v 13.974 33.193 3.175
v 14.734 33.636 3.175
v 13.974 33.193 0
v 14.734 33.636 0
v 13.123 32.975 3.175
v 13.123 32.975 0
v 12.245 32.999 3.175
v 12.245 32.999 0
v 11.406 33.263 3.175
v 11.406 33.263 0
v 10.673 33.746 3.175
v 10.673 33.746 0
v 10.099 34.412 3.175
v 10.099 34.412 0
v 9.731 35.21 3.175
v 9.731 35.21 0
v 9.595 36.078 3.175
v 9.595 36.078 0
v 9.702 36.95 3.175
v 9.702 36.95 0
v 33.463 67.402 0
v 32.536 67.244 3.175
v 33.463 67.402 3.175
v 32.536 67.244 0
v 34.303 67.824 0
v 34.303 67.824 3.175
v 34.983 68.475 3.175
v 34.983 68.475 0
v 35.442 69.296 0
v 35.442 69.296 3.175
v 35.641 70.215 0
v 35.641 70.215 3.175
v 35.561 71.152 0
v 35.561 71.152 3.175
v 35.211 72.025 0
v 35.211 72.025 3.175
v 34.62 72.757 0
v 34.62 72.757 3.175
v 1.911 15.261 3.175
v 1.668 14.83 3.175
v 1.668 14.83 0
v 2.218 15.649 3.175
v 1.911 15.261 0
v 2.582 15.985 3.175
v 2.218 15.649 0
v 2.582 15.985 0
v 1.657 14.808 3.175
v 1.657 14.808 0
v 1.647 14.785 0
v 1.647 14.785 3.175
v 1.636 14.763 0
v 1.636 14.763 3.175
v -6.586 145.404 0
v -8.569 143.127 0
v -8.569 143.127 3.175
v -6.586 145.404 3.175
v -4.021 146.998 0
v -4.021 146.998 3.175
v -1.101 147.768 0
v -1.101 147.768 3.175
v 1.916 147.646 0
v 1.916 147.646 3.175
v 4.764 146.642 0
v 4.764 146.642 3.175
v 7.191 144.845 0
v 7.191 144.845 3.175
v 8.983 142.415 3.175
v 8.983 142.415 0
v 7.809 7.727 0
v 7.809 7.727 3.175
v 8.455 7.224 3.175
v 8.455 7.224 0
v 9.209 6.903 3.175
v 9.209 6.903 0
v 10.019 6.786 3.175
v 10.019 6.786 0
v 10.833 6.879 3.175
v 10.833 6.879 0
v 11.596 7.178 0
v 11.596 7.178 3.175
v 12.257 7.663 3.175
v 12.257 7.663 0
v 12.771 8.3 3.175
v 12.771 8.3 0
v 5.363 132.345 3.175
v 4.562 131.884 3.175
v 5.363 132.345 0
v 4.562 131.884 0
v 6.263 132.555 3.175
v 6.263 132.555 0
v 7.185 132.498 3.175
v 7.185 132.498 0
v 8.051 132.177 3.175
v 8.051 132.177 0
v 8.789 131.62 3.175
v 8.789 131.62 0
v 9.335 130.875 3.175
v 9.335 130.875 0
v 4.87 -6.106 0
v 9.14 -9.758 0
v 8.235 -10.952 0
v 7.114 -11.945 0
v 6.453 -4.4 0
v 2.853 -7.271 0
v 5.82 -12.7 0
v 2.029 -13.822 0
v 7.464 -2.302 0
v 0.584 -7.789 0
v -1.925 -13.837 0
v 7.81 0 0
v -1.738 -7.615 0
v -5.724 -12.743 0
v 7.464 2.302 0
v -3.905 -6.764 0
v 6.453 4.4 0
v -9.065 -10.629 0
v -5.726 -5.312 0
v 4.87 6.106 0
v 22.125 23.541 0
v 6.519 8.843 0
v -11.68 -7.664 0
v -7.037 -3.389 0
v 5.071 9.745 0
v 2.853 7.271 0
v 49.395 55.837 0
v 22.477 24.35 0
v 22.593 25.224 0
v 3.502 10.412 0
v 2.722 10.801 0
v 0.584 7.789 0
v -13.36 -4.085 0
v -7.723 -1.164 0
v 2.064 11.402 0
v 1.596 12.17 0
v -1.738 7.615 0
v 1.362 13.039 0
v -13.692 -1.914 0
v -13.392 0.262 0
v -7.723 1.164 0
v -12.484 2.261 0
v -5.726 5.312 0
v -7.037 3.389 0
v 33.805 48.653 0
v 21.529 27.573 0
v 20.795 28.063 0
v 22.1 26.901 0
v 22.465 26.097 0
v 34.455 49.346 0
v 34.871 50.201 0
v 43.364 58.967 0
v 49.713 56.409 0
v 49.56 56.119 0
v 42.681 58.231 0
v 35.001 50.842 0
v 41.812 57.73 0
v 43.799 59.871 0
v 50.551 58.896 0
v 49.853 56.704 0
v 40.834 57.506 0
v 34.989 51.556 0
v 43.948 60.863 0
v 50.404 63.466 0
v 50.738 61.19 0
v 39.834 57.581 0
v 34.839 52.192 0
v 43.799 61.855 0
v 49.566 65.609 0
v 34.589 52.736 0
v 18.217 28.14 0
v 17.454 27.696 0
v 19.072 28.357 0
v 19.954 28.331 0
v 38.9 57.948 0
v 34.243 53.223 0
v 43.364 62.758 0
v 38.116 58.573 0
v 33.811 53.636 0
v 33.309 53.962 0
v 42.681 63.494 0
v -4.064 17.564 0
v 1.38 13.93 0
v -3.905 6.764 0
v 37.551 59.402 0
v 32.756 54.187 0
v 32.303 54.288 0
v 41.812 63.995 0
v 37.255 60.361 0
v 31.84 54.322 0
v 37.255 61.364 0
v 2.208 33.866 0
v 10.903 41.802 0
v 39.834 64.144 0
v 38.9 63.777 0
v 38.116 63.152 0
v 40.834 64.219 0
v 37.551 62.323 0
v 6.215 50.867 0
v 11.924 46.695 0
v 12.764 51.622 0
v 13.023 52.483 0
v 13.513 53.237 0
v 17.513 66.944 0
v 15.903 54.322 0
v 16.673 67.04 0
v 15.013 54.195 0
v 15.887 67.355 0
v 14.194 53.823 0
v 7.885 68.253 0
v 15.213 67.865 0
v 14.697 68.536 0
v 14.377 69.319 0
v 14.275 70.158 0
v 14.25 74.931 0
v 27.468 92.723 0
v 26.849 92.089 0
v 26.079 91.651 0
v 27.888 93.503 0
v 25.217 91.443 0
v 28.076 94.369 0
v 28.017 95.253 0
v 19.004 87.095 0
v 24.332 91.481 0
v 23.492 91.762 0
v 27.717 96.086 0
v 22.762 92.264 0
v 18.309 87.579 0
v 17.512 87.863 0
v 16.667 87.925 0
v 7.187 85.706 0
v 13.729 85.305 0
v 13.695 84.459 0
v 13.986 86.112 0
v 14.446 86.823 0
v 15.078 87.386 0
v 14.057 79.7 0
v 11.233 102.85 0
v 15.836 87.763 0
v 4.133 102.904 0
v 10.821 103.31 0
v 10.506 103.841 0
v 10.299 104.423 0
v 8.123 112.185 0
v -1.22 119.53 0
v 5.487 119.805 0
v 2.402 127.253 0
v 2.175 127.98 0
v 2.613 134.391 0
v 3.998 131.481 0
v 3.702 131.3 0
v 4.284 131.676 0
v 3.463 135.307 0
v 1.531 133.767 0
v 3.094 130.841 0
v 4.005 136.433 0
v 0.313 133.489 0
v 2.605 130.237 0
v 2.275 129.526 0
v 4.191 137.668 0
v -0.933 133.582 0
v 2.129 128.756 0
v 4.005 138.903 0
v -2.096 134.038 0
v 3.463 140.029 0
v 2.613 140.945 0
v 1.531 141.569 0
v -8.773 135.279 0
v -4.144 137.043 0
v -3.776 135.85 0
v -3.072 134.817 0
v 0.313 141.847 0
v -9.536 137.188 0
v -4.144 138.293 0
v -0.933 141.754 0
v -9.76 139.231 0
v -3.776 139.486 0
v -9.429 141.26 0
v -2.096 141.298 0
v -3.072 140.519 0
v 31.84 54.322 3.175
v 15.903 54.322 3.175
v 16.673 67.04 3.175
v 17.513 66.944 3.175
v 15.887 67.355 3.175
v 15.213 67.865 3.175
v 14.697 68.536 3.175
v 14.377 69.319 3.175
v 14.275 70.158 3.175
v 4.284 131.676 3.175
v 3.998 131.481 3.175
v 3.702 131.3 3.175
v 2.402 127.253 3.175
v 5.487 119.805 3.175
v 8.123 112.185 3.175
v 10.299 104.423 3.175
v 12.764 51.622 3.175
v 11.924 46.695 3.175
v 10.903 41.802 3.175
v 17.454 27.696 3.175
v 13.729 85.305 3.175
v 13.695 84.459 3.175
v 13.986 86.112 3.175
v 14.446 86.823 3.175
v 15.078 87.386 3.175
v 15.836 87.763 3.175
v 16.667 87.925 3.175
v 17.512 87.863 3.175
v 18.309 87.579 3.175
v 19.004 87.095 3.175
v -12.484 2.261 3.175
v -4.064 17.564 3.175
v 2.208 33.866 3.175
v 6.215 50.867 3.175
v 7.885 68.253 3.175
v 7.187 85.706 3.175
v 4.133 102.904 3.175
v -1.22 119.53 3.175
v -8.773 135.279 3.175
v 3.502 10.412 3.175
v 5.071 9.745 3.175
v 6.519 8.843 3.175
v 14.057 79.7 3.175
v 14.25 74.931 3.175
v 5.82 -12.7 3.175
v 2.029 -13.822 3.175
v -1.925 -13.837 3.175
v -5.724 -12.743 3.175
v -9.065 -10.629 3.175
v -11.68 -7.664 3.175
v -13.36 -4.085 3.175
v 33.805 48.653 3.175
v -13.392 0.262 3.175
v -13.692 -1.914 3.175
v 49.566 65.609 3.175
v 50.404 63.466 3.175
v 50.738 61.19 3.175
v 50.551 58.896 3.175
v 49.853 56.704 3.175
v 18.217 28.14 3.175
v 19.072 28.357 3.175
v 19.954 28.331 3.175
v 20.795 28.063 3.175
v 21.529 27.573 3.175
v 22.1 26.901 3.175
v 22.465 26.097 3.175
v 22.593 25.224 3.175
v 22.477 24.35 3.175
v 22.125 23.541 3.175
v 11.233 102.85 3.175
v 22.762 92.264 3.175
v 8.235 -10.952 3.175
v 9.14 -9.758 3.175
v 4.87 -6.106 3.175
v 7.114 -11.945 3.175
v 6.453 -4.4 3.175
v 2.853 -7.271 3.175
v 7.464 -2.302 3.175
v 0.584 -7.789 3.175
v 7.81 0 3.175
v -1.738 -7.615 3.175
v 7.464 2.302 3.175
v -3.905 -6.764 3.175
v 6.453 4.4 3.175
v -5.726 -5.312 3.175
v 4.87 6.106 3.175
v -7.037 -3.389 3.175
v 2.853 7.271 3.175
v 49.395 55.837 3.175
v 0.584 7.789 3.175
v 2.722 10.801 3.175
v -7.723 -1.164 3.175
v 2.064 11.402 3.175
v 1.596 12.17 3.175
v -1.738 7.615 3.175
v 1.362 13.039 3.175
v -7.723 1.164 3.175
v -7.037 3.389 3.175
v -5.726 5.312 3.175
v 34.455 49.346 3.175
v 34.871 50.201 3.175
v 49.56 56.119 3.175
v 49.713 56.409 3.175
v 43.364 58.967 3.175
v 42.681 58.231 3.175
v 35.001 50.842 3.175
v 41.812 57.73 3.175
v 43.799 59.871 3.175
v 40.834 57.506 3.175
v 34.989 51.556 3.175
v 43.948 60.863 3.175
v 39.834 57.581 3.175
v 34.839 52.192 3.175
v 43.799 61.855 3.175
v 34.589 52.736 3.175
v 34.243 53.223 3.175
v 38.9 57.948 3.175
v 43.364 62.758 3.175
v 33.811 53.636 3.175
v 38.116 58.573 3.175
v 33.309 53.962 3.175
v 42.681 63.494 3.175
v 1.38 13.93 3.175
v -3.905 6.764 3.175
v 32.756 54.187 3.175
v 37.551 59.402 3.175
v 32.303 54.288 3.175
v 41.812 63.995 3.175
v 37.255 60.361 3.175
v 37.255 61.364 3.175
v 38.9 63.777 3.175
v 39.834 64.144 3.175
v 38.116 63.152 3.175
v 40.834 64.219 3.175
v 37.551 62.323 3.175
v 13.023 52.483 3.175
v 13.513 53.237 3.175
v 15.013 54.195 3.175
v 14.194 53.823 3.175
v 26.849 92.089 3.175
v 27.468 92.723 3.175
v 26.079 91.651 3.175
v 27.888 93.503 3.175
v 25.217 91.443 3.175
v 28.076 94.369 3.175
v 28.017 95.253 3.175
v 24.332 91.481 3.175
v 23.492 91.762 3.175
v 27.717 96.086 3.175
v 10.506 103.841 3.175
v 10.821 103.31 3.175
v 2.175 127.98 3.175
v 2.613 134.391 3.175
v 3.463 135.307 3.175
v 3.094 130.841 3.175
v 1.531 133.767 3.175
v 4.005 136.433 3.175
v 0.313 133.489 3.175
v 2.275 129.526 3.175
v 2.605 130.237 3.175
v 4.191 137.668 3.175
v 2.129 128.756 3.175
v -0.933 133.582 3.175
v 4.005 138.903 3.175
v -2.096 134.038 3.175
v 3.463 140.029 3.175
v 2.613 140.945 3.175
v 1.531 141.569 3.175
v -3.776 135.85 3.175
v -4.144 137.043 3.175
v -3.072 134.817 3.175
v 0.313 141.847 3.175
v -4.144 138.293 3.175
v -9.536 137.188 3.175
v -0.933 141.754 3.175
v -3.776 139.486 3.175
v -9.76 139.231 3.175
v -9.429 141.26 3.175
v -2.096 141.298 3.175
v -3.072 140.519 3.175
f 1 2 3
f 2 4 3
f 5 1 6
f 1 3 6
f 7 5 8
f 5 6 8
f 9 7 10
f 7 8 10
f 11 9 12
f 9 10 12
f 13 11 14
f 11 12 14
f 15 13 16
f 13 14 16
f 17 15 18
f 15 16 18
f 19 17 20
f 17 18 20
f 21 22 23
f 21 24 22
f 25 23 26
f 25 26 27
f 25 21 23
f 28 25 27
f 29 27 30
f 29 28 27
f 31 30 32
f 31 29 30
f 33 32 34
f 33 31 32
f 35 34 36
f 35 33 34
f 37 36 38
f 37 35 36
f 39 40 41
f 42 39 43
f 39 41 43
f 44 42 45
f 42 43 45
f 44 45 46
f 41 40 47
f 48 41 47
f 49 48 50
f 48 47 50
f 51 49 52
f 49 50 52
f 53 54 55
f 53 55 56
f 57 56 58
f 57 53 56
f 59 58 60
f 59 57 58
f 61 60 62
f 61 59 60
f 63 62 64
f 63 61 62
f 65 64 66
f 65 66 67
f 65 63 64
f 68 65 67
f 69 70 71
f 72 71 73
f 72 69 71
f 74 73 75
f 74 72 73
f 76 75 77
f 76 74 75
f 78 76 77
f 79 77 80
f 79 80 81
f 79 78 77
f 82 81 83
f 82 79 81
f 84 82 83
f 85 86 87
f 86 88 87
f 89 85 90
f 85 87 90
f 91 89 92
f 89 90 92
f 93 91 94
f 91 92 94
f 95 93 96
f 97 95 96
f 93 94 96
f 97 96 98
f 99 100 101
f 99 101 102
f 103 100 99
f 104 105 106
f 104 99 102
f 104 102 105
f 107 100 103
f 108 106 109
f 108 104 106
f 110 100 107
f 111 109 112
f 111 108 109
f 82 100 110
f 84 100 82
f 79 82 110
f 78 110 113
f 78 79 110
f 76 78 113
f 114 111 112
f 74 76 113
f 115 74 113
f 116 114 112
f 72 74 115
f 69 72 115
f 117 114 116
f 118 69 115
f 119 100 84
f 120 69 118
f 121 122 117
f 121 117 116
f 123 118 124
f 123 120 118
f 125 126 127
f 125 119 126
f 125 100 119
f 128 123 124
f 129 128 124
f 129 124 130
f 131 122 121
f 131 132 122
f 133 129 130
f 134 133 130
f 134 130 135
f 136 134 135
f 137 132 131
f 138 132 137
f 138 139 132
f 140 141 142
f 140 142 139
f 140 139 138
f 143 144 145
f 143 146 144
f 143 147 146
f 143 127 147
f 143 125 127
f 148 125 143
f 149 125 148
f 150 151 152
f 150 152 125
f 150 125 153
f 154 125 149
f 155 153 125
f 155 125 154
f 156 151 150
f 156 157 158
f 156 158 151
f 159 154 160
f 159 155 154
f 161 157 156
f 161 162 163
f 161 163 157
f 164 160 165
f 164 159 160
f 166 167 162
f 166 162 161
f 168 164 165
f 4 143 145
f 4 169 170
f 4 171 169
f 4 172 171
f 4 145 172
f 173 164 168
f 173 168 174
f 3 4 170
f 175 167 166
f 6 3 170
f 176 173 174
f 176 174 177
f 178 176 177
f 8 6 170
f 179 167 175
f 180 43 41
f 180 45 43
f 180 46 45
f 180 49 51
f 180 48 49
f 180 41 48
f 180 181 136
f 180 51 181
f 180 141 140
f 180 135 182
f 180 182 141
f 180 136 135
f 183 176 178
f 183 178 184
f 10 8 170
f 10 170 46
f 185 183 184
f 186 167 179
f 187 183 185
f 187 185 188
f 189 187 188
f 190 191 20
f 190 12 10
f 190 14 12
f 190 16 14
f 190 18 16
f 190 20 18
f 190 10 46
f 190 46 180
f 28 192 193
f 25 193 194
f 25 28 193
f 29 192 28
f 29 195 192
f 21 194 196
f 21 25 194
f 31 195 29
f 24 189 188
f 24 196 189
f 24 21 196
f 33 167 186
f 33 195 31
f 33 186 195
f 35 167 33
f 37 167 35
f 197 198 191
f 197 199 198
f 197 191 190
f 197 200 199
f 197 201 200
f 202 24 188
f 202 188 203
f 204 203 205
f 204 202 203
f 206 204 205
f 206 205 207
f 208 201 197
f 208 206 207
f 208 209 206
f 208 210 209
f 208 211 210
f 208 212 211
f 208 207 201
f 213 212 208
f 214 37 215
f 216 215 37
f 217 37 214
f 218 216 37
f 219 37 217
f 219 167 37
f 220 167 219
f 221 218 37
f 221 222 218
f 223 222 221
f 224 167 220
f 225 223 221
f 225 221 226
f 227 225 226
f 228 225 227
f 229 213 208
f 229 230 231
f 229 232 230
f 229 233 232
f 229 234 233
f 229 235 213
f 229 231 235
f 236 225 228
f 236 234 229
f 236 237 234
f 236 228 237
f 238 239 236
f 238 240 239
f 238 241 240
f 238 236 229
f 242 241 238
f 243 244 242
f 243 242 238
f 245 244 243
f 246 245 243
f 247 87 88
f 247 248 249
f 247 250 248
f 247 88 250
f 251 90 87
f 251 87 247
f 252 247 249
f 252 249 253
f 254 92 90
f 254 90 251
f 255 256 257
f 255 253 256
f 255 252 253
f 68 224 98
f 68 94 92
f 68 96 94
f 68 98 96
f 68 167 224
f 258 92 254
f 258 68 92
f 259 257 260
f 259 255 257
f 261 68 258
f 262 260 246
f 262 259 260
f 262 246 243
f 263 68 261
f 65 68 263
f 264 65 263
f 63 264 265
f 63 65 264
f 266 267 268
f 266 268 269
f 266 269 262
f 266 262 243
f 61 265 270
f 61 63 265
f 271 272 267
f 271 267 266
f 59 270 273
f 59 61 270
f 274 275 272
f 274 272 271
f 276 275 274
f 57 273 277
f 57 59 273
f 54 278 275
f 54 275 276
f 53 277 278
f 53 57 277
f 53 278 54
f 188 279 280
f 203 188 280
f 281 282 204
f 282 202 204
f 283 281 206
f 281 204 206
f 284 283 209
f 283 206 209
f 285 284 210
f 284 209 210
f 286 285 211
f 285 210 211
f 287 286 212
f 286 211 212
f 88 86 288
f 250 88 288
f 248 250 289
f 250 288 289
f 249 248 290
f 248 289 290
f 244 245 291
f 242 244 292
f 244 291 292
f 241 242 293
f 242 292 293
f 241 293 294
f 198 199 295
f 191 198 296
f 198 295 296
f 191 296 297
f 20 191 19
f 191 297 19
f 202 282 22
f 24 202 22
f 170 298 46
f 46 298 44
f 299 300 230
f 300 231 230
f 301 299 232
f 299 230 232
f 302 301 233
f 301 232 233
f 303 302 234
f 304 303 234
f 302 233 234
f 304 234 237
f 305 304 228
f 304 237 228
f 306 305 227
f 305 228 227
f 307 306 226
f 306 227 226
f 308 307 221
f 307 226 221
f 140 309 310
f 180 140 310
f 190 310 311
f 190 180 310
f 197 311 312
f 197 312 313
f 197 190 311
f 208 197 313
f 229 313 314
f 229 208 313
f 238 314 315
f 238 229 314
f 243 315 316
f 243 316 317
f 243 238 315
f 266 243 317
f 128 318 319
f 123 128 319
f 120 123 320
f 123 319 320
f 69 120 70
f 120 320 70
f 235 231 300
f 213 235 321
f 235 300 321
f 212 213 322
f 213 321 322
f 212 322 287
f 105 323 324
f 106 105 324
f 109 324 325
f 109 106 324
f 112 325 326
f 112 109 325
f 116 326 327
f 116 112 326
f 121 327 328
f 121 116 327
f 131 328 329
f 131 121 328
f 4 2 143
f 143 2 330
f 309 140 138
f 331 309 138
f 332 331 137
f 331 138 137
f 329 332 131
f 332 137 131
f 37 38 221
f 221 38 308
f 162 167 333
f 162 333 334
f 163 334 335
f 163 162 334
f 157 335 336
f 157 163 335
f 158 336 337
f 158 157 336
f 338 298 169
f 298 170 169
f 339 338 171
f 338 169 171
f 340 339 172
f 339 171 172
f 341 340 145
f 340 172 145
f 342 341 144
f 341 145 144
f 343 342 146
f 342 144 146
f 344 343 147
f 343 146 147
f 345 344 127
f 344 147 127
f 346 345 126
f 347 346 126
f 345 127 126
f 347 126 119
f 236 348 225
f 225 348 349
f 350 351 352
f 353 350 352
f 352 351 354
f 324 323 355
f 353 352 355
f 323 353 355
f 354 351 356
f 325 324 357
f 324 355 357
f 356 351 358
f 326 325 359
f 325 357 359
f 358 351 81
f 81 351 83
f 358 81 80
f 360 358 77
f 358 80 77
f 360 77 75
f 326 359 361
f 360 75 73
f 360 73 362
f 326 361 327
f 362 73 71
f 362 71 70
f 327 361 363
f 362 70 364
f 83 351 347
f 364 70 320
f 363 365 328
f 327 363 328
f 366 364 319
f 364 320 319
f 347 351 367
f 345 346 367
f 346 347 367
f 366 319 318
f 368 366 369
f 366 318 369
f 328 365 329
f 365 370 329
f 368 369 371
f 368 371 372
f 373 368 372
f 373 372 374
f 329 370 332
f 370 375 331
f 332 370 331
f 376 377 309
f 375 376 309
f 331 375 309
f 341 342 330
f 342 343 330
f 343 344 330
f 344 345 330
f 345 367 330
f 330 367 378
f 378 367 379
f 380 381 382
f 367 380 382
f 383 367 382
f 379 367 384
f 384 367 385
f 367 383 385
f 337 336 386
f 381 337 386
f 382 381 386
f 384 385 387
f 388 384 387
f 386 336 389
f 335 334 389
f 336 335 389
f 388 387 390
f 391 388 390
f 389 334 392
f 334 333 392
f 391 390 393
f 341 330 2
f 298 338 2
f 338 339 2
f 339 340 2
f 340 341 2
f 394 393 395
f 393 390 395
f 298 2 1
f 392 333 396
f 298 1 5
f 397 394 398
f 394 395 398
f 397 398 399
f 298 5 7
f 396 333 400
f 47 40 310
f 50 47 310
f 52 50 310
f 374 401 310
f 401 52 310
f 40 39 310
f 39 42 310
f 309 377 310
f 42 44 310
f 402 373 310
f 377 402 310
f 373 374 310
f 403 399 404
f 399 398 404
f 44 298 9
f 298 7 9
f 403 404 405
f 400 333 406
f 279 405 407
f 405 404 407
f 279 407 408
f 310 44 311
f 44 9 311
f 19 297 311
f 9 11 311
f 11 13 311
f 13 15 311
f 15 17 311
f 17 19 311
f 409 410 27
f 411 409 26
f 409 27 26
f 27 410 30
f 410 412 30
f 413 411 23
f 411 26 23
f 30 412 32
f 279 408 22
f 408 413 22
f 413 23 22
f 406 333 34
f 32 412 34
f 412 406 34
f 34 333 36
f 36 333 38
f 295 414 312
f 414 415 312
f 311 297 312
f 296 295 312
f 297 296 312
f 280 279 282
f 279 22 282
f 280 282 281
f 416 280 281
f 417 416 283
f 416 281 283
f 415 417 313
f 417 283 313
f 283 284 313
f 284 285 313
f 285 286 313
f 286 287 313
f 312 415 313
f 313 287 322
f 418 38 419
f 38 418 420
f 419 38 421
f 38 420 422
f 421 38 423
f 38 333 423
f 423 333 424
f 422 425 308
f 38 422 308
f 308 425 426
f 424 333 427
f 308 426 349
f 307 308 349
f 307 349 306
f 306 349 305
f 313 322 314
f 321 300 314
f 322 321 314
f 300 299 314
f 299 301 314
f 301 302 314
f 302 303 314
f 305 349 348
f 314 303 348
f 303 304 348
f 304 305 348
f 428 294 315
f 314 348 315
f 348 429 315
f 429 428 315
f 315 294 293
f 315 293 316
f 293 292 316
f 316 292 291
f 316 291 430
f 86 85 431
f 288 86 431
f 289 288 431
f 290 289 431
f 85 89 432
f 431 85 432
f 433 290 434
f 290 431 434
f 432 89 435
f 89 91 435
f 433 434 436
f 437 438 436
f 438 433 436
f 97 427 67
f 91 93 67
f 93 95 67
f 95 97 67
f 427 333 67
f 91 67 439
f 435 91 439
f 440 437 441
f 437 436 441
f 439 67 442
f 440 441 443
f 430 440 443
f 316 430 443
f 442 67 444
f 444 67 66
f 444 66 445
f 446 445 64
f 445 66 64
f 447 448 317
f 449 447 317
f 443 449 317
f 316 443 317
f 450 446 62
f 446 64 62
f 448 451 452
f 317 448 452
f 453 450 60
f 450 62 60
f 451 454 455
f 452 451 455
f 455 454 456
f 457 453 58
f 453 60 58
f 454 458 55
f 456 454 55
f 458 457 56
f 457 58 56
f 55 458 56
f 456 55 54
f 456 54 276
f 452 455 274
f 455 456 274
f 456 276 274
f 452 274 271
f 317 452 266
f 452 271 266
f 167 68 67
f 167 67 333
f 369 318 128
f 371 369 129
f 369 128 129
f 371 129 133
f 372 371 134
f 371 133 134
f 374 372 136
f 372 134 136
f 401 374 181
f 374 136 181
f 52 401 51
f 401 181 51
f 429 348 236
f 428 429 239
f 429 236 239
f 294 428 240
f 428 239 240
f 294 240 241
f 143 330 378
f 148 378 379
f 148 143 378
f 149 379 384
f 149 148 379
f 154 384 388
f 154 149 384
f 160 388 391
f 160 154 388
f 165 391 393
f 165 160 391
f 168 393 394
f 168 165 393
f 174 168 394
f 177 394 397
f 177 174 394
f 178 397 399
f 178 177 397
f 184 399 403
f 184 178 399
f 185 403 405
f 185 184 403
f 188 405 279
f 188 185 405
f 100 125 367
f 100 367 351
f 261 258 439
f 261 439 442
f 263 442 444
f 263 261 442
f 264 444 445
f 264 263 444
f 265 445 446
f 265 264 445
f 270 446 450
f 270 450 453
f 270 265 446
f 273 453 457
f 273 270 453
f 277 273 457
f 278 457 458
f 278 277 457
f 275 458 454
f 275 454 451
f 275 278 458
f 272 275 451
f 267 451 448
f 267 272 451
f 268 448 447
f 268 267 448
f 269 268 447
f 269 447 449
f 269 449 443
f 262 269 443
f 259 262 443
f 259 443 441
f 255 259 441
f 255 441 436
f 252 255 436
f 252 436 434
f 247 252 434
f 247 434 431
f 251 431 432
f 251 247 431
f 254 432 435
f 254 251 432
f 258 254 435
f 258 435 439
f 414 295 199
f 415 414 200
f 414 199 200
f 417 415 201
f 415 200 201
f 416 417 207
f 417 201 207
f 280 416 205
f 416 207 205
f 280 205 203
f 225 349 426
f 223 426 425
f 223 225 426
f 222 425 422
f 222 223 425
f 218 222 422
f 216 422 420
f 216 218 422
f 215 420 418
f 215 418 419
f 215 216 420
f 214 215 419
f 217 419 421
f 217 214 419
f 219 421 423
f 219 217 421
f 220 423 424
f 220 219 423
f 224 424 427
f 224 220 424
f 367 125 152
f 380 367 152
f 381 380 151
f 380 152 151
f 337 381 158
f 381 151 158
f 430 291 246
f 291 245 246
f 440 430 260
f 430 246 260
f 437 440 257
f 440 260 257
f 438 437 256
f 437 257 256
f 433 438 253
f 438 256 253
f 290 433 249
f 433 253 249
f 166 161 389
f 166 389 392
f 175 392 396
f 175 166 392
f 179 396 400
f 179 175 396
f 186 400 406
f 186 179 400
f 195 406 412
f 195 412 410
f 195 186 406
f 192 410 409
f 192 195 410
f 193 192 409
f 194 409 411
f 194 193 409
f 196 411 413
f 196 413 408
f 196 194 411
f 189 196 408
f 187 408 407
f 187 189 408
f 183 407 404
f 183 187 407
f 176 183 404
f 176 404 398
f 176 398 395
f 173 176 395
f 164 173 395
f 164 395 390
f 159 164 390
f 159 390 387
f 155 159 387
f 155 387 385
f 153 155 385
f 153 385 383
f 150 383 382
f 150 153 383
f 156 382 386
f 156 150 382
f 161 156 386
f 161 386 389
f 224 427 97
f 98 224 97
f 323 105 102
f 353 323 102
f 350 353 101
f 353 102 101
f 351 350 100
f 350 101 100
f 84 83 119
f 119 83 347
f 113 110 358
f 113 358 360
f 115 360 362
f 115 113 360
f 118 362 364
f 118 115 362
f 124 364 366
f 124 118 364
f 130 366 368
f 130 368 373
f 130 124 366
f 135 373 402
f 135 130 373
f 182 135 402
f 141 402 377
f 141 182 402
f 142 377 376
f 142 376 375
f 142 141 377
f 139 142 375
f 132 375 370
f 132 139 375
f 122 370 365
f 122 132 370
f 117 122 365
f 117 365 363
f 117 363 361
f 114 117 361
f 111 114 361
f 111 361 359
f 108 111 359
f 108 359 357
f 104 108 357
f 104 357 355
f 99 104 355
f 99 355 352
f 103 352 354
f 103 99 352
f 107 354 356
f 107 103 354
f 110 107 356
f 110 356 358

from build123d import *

# Parameters (mm, degrees)
SKETCH1_R           = 7.8105
SKETCH1_R_2         = 3.3655
SKETCH1_R_3         = 4.191
BOSS_EXTRUDE1_DEPTH = 3.175
CUT_EXTRUDE1_DEPTH  = 6.35
FILLET1_R           = 3.175
FILLET5_R           = 7.62


with BuildPart() as part:
    # Sketch1 → Boss-Extrude1 (new body)
    with BuildSketch(Plane.XY):
        with BuildLine():
            Line((8.98309661, 142.414532976), (49.565953559, 65.609056962))
            ThreePointArc((49.565953559, 65.609056962), (50.742856949, 60.862523985), (49.565953559, 56.115991009))
            Line((49.565953559, 56.115991009), (8.177790267, -11.326281223))
            ThreePointArc((8.177790267, -11.326281223), (-6.360706327, -12.437938536), (-13.97, 0))
            ThreePointArc((-13.97, 0), (7.886144716, 68.281846548), (-10.16, 137.668))
            ThreePointArc((-10.16, 137.668), (-2.445131739, 147.529385845), (8.98309661, 142.414532976))
        make_face()
        Circle(SKETCH1_R, mode=Mode.SUBTRACT)
        with Locations((40.582856949, 60.862523985)):
            Circle(SKETCH1_R_2, mode=Mode.SUBTRACT)
        with Locations((0, 137.668)):
            Circle(SKETCH1_R_3, mode=Mode.SUBTRACT)
    extrude(amount=BOSS_EXTRUDE1_DEPTH)

    # Sketch2 → Cut-Extrude1 (cut)
    with BuildSketch(Plane.XY.offset(3.175)):
        with BuildLine():
            ThreePointArc((-0.197260951, 10.983728801), (6.068963009, 9.156904403), (10.192723194, 4.097511946))
            Line((10.192723194, 4.097511946), (31.425957659, 38.69720097))
            Line((31.425957659, 38.69720097), (1.983387122, 15.513785915))
            ThreePointArc((1.983387122, 15.513785915), (0.914134712, 13.238614042), (-0.197260951, 10.983728801))
        make_face()
        with BuildLine():
            Line((6.74876061, 27.348367338), (41.023773829, 54.336902746))
            ThreePointArc((41.023773829, 54.336902746), (40.803440874, 54.325744734), (40.582856949, 54.322023985))
            Line((40.582856949, 54.322023985), (13.144472644, 54.322023985))
            ThreePointArc((13.144472644, 54.322023985), (10.640204067, 40.670739444), (6.74876061, 27.348367338))
        make_face()
        with BuildLine():
            Line((14.194143868, 66.878256842), (40.452496082, 67.401724723))
            Line((40.452496082, 67.401724723), (12.62696706, 92.949274424))
            ThreePointArc((12.62696706, 92.949274424), (14.041969258, 79.951721077), (14.194143868, 66.878256842))
        make_face()
        with BuildLine():
            Line((10.524958055, 103.49970509), (36.307285582, 79.828087082))
            Line((36.307285582, 79.828087082), (6.983478118, 135.325140768))
            ThreePointArc((6.983478118, 135.325140768), (4.680665913, 131.980353508), (0.955265361, 130.364204816))
            ThreePointArc((0.955265361, 130.364204816), (6.450850846, 117.185134994), (10.524958055, 103.49970509))
        make_face()
    extrude(amount=-CUT_EXTRUDE1_DEPTH, mode=Mode.SUBTRACT)

    # Fillet1
    fillet1_edges = [part.edges().sort_by_distance(p)[0] for p in [
        (1.983387122, 15.513785915, 1.5875),
        (-0.197260951, 10.983728801, 1.5875),
        (10.192723194, 4.097511946, 1.5875),
        (31.425957659, 38.69720097, 1.5875),
        (41.023773829, 54.336902746, 1.5875),
        (6.74876061, 27.348367338, 1.5875),
        (13.144472644, 54.322023985, 1.5875),
        (12.62696706, 92.949274424, 1.5875),
        (14.194143868, 66.878256842, 1.5875),
        (40.452496082, 67.401724723, 1.5875),
        (36.307285582, 79.828087082, 1.5875),
        (10.524958055, 103.49970509, 1.5875),
        (0.955265361, 130.364204816, 1.5875),
        (6.983478118, 135.325140768, 1.5875),
    ]]
    fillet(fillet1_edges, radius=FILLET1_R)

    # Fillet5
    # the kernel refuses this fillet: 7.62 mm, written as the material it takes off along each edge
    with BuildSketch(Plane(origin=(49.565953559, 56.115991009, -1.635210381), x_dir=(0.4384758636480836, 0.8987429649227121, 0), z_dir=(0, 0, 1))) as fillet5_piece_1:
        with BuildLine():
            CenterArc((0.408802595, 7.616051271), FILLET5_R, 264.46995043, 7.374672414)
            Line((-0.325519955, 0.031516322), (0, 0))
            ThreePointArc((0, 0), (0.327042076, -0.005264972), (0.654084152, 0))
        make_face()
    extrude(amount=6.445420761, mode=Mode.SUBTRACT)
    with BuildSketch(Plane(origin=(8.177790267, -11.326281223, -6.821790927), x_dir=(-0.8640520418582298, -0.5034024920087542, 0), z_dir=(0, 0, 1))) as fillet5_piece_2:
        with BuildLine():
            CenterArc((1.984520997, -7.583572591), FILLET5_R, 84.39536353, 33.842547752)
            Line((-1.620758554, -0.870424346), (0, 0))
            ThreePointArc((0, 0), (1.364358185, 0.066783583), (2.728716371, 0))
        make_face()
    extrude(amount=16.818581854, mode=Mode.SUBTRACT)
    with BuildSketch(Plane(origin=(-13.97, 0, -10.324988133), x_dir=(0.5491862360699723, 0.8356999928869789, 0), z_dir=(0, 0, 1))) as fillet5_piece_3:
        with BuildLine():
            CenterArc((2.785592727, -7.619579496), FILLET5_R, 90.601931521, 49.710102388)
            ThreePointArc((-3.078254062, -2.753400211), (-1.641438538, -1.262317601), (0, 0))
            ThreePointArc((0, 0), (1.352770433, -0.007105957), (2.705540865, 0))
        make_face()
    extrude(amount=23.824976265, mode=Mode.SUBTRACT)
    with BuildSketch(Plane(origin=(-10.16, 137.668, -14.214457568), x_dir=(0.2798121568434471, 0.96005476764746, 0), z_dir=(0, 0, 1))) as fillet5_piece_4:
        with BuildLine():
            CenterArc((3.553614392, -7.315617329), FILLET5_R, 73.751006034, 62.011444153)
            ThreePointArc((-1.90576169, -1.999640205), (-0.947518647, -1.004930558), (0, 0))
            ThreePointArc((0, 0), (2.842891514, 0.405843561), (5.685783027, 0))
        make_face()
    extrude(amount=31.603915135, mode=Mode.SUBTRACT)


solid = part.part
